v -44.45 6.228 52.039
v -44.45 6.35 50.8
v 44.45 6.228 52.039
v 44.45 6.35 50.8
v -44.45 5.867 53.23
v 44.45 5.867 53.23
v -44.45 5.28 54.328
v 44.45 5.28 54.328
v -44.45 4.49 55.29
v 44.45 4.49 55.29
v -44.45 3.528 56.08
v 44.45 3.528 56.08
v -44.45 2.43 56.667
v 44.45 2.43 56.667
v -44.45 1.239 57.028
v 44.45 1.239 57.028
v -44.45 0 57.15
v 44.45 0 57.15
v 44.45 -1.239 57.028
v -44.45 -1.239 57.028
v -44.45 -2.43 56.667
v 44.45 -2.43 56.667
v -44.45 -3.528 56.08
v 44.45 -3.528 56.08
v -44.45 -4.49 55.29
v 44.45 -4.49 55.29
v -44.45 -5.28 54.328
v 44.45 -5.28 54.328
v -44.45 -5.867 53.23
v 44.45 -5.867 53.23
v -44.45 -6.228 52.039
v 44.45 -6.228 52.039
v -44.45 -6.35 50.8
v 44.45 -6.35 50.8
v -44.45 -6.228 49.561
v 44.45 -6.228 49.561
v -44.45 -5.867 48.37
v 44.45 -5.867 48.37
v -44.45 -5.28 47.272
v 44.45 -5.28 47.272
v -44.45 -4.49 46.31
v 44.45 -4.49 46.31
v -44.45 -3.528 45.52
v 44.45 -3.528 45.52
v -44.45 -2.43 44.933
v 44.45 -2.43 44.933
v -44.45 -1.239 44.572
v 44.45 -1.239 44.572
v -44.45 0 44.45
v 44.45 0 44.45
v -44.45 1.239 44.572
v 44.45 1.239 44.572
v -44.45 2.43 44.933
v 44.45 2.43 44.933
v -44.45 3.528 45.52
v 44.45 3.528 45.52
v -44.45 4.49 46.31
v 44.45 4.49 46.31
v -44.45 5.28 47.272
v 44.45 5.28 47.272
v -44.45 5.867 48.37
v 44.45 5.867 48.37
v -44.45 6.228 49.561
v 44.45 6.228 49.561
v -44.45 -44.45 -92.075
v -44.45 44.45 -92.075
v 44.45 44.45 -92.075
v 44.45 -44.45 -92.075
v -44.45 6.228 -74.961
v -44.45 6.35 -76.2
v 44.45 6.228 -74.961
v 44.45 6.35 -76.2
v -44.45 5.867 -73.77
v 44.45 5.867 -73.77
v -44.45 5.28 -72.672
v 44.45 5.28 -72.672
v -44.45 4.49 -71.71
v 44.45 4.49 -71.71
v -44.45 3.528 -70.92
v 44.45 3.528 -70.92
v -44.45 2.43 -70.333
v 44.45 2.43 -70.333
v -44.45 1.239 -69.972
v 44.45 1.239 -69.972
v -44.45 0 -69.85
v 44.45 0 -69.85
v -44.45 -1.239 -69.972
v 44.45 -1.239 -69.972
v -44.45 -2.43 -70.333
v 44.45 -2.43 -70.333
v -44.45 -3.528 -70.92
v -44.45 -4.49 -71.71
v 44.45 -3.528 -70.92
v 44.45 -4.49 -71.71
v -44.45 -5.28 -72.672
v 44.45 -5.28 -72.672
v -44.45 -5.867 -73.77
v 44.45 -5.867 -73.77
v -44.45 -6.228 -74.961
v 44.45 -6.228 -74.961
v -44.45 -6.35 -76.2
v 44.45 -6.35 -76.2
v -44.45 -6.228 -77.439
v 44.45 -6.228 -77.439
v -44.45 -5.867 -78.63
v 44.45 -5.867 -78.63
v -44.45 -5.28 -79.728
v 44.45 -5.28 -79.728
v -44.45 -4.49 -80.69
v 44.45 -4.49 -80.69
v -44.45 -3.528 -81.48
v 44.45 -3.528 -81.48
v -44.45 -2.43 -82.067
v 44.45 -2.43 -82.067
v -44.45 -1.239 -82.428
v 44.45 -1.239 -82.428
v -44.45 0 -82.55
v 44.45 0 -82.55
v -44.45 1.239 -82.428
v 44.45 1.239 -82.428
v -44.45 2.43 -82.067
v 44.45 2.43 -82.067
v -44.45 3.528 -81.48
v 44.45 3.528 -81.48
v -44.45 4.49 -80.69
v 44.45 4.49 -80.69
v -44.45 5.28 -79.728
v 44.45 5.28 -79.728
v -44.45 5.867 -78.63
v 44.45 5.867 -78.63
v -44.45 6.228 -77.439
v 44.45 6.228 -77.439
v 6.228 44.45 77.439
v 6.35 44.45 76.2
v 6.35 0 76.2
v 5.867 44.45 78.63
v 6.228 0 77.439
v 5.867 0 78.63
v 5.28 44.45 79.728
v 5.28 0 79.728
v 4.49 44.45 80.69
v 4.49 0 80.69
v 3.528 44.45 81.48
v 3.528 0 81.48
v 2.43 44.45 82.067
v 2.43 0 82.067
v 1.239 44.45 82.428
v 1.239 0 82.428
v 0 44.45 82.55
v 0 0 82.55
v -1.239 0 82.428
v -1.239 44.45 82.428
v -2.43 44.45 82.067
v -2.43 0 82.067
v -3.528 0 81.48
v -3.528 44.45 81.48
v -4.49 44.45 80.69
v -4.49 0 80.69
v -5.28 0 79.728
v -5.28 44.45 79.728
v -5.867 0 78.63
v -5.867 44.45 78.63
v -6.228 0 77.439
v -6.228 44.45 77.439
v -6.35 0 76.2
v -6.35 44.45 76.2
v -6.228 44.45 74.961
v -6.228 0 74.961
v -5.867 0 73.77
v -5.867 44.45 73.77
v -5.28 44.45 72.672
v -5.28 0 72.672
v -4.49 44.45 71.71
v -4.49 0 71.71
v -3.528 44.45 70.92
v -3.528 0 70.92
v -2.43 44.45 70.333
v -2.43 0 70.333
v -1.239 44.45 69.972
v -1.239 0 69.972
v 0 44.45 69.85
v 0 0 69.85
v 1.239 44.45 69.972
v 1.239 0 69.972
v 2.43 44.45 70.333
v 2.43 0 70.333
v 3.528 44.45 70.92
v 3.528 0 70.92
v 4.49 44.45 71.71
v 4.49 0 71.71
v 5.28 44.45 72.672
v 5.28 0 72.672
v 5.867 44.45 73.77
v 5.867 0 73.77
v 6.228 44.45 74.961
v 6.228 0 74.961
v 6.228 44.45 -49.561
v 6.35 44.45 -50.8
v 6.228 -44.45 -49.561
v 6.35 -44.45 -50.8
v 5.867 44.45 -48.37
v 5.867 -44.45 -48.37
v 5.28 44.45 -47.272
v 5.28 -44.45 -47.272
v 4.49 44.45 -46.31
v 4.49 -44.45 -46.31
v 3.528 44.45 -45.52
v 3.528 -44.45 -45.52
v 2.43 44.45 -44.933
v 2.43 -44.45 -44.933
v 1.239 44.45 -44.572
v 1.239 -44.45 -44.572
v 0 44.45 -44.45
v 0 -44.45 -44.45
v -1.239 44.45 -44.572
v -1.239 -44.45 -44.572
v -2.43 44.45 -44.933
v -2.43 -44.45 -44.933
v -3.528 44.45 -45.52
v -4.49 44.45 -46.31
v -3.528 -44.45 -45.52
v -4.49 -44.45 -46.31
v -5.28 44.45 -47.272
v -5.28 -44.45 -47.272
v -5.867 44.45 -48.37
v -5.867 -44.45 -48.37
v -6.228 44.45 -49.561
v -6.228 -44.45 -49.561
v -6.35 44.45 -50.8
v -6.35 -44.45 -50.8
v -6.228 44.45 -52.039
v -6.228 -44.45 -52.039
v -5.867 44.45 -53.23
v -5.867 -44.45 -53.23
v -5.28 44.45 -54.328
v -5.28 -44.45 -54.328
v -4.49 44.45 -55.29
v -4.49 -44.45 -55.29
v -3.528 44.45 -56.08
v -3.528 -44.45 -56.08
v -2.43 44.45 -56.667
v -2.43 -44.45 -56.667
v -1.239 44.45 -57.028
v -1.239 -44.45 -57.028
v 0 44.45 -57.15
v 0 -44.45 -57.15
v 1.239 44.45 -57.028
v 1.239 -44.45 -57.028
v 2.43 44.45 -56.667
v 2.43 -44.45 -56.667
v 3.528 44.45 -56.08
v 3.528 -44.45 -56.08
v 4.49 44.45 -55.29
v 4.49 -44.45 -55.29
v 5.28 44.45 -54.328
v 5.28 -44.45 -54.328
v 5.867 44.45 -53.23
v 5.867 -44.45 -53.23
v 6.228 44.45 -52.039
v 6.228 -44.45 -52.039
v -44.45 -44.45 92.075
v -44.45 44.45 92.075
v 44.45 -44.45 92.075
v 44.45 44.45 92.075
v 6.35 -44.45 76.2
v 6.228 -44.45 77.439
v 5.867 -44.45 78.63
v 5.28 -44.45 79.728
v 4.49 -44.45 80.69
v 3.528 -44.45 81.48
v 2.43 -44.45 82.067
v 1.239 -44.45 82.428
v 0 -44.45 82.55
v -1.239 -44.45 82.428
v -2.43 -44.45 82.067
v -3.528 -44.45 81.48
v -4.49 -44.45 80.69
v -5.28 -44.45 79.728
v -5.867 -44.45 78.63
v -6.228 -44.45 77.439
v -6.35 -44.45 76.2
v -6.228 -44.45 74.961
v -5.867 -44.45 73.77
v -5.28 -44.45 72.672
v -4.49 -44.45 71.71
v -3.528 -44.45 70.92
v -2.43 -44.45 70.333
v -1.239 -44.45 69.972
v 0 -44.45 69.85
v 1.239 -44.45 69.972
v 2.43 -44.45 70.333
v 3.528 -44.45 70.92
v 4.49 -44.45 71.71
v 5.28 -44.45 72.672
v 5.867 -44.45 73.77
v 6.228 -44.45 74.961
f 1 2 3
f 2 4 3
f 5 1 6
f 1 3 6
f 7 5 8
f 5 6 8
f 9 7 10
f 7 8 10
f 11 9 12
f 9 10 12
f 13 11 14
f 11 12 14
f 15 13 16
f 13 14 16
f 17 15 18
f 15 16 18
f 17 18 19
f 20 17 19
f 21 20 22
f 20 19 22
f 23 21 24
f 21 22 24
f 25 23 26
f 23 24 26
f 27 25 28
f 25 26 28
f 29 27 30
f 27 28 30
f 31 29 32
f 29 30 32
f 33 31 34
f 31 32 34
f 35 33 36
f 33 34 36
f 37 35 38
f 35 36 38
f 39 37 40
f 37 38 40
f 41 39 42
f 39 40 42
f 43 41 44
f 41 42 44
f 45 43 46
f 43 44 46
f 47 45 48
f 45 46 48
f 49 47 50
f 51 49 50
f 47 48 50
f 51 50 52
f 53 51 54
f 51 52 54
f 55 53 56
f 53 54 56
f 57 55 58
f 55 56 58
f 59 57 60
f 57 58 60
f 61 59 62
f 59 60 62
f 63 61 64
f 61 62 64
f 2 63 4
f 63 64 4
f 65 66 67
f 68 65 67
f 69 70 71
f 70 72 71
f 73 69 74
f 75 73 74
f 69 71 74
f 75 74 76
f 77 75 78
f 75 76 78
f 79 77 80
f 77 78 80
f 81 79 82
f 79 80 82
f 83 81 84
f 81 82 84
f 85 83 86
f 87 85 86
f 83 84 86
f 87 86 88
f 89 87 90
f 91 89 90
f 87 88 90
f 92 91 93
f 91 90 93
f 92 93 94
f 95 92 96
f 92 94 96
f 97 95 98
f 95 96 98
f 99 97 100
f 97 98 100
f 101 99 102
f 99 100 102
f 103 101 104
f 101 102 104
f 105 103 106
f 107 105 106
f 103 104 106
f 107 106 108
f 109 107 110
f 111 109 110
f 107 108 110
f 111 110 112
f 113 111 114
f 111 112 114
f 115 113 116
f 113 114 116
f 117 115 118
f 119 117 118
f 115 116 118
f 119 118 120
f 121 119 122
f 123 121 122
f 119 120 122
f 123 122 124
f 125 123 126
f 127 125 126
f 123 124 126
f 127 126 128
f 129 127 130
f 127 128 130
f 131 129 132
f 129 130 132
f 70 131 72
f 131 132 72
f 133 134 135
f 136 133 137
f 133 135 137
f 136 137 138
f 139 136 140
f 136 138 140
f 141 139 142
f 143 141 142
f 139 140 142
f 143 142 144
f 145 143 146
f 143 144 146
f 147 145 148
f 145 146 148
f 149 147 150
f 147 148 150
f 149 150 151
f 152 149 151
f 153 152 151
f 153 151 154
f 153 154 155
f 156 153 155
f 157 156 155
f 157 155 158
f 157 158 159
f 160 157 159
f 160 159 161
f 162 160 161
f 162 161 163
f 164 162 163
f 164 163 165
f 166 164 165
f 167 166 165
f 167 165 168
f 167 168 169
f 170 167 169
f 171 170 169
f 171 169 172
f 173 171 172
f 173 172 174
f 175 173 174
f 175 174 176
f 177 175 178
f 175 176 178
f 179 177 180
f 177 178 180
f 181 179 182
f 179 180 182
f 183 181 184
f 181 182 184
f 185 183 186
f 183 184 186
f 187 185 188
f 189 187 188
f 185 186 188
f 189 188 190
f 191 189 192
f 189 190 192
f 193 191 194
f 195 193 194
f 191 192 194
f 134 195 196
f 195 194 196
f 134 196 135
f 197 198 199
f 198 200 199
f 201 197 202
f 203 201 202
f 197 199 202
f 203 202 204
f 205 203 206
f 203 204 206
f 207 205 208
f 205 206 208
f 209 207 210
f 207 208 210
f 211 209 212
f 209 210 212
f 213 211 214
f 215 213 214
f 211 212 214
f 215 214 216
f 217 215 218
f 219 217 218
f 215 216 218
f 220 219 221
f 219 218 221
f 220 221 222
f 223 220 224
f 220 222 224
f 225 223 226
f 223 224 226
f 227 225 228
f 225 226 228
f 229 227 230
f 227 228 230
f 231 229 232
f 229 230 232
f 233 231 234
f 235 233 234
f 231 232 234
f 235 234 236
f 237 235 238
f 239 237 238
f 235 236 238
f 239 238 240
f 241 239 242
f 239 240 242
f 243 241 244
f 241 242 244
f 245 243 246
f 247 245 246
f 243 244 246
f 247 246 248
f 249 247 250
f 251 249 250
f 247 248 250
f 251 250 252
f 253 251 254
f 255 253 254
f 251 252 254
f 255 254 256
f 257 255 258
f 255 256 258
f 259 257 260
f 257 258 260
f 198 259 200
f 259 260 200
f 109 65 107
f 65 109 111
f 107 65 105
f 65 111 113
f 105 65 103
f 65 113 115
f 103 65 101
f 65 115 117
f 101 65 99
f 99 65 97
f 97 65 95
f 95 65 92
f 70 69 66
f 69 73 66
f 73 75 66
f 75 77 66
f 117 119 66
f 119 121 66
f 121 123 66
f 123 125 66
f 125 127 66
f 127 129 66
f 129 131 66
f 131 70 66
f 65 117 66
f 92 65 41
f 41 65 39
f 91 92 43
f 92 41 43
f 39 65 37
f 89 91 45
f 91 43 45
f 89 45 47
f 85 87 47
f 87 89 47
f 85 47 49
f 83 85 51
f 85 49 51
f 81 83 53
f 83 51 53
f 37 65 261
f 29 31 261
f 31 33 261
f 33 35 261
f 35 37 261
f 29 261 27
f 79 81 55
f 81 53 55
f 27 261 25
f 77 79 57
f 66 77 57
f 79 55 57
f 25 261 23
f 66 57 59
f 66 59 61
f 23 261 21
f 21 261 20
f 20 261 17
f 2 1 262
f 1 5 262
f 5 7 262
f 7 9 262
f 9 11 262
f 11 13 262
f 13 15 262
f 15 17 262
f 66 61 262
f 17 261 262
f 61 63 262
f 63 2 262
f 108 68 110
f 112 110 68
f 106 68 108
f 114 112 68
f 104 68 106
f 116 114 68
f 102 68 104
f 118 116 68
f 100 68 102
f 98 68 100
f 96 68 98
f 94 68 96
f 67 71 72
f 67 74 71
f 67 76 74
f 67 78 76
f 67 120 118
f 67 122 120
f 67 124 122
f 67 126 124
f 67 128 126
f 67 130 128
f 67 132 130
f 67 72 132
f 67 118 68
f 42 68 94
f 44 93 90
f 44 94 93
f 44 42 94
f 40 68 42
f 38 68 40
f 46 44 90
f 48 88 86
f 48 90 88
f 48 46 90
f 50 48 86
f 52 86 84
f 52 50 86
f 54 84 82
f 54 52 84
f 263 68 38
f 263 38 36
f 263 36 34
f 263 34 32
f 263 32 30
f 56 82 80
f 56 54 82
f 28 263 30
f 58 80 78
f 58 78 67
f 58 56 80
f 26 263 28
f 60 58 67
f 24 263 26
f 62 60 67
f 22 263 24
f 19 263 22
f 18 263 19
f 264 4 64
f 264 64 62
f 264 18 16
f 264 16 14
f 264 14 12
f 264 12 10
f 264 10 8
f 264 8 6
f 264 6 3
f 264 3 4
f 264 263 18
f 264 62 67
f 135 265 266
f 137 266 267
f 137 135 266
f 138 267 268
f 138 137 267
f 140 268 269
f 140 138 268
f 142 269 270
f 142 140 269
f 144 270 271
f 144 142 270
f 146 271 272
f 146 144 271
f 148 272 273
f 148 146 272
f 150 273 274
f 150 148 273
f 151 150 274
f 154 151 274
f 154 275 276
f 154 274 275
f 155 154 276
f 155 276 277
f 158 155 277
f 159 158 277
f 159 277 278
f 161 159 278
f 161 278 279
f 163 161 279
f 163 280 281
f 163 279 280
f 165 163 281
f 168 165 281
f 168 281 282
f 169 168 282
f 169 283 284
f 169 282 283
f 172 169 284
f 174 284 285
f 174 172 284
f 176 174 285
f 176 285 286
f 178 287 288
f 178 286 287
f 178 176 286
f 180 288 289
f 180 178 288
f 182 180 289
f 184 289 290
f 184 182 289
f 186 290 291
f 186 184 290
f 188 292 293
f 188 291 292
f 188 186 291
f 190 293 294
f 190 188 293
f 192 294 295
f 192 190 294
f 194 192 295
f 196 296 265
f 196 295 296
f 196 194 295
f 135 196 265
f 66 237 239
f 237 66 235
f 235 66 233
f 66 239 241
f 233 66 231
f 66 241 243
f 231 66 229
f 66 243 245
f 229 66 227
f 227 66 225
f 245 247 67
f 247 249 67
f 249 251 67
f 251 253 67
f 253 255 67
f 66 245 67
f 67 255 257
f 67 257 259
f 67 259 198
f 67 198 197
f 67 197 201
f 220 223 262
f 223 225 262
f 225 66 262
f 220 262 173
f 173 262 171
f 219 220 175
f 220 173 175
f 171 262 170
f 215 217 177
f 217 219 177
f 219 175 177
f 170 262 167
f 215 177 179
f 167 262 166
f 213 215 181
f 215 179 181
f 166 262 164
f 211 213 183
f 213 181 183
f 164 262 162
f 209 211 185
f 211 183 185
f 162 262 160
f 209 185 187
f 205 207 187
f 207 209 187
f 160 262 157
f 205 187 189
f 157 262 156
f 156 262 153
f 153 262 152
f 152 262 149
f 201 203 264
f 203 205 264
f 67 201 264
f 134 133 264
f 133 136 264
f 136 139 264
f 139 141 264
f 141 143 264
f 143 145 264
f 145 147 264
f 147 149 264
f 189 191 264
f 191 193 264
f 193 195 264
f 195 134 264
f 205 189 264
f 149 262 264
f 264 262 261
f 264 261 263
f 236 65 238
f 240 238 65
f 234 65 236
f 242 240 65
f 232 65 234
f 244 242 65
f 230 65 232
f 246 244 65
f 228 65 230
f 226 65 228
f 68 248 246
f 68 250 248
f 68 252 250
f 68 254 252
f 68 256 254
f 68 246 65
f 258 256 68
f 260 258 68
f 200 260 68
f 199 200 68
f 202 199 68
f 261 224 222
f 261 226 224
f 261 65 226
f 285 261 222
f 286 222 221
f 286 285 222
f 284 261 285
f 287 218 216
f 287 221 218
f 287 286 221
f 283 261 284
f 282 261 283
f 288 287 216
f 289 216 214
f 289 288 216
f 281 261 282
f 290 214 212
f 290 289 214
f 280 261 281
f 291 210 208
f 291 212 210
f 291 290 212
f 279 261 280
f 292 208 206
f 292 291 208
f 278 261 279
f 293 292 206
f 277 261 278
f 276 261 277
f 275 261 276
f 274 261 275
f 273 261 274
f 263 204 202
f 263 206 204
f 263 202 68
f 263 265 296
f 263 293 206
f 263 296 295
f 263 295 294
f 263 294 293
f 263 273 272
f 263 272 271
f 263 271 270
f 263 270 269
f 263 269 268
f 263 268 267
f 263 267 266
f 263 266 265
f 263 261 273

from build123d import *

# Parameters (mm, degrees)
F0_W     = 88.9
F0_H     = 88.9
F1_DEPTH = 92.075
F2_R     = 6.35
F3_DEPTH = 50.8
F4_R     = 6.35
F5_DEPTH = 50.8


with BuildPart() as f1:
    # F0 (on Top) → F1 (new body, symmetric)
    with BuildSketch(Plane.XY):
        Rectangle(F0_W, F0_H)
    extrude(amount=F1_DEPTH, both=True)

    # F2 (on Front) → F3 (cut, symmetric)
    with BuildSketch(Plane.XZ):
        with Locations((0, 76.2)):
            Circle(F2_R)
        with Locations((0, -50.8)):
            Circle(F2_R)
    extrude(amount=F3_DEPTH, both=True, mode=Mode.SUBTRACT)

    # F4 (on Right) → F5 (cut, symmetric)
    with BuildSketch(Plane.YZ):
        with Locations((0, 50.8)):
            Circle(F4_R)
        with Locations((0, -76.2)):
            Circle(F4_R)
    extrude(amount=F5_DEPTH, both=True, mode=Mode.SUBTRACT)


solid = f1.part
